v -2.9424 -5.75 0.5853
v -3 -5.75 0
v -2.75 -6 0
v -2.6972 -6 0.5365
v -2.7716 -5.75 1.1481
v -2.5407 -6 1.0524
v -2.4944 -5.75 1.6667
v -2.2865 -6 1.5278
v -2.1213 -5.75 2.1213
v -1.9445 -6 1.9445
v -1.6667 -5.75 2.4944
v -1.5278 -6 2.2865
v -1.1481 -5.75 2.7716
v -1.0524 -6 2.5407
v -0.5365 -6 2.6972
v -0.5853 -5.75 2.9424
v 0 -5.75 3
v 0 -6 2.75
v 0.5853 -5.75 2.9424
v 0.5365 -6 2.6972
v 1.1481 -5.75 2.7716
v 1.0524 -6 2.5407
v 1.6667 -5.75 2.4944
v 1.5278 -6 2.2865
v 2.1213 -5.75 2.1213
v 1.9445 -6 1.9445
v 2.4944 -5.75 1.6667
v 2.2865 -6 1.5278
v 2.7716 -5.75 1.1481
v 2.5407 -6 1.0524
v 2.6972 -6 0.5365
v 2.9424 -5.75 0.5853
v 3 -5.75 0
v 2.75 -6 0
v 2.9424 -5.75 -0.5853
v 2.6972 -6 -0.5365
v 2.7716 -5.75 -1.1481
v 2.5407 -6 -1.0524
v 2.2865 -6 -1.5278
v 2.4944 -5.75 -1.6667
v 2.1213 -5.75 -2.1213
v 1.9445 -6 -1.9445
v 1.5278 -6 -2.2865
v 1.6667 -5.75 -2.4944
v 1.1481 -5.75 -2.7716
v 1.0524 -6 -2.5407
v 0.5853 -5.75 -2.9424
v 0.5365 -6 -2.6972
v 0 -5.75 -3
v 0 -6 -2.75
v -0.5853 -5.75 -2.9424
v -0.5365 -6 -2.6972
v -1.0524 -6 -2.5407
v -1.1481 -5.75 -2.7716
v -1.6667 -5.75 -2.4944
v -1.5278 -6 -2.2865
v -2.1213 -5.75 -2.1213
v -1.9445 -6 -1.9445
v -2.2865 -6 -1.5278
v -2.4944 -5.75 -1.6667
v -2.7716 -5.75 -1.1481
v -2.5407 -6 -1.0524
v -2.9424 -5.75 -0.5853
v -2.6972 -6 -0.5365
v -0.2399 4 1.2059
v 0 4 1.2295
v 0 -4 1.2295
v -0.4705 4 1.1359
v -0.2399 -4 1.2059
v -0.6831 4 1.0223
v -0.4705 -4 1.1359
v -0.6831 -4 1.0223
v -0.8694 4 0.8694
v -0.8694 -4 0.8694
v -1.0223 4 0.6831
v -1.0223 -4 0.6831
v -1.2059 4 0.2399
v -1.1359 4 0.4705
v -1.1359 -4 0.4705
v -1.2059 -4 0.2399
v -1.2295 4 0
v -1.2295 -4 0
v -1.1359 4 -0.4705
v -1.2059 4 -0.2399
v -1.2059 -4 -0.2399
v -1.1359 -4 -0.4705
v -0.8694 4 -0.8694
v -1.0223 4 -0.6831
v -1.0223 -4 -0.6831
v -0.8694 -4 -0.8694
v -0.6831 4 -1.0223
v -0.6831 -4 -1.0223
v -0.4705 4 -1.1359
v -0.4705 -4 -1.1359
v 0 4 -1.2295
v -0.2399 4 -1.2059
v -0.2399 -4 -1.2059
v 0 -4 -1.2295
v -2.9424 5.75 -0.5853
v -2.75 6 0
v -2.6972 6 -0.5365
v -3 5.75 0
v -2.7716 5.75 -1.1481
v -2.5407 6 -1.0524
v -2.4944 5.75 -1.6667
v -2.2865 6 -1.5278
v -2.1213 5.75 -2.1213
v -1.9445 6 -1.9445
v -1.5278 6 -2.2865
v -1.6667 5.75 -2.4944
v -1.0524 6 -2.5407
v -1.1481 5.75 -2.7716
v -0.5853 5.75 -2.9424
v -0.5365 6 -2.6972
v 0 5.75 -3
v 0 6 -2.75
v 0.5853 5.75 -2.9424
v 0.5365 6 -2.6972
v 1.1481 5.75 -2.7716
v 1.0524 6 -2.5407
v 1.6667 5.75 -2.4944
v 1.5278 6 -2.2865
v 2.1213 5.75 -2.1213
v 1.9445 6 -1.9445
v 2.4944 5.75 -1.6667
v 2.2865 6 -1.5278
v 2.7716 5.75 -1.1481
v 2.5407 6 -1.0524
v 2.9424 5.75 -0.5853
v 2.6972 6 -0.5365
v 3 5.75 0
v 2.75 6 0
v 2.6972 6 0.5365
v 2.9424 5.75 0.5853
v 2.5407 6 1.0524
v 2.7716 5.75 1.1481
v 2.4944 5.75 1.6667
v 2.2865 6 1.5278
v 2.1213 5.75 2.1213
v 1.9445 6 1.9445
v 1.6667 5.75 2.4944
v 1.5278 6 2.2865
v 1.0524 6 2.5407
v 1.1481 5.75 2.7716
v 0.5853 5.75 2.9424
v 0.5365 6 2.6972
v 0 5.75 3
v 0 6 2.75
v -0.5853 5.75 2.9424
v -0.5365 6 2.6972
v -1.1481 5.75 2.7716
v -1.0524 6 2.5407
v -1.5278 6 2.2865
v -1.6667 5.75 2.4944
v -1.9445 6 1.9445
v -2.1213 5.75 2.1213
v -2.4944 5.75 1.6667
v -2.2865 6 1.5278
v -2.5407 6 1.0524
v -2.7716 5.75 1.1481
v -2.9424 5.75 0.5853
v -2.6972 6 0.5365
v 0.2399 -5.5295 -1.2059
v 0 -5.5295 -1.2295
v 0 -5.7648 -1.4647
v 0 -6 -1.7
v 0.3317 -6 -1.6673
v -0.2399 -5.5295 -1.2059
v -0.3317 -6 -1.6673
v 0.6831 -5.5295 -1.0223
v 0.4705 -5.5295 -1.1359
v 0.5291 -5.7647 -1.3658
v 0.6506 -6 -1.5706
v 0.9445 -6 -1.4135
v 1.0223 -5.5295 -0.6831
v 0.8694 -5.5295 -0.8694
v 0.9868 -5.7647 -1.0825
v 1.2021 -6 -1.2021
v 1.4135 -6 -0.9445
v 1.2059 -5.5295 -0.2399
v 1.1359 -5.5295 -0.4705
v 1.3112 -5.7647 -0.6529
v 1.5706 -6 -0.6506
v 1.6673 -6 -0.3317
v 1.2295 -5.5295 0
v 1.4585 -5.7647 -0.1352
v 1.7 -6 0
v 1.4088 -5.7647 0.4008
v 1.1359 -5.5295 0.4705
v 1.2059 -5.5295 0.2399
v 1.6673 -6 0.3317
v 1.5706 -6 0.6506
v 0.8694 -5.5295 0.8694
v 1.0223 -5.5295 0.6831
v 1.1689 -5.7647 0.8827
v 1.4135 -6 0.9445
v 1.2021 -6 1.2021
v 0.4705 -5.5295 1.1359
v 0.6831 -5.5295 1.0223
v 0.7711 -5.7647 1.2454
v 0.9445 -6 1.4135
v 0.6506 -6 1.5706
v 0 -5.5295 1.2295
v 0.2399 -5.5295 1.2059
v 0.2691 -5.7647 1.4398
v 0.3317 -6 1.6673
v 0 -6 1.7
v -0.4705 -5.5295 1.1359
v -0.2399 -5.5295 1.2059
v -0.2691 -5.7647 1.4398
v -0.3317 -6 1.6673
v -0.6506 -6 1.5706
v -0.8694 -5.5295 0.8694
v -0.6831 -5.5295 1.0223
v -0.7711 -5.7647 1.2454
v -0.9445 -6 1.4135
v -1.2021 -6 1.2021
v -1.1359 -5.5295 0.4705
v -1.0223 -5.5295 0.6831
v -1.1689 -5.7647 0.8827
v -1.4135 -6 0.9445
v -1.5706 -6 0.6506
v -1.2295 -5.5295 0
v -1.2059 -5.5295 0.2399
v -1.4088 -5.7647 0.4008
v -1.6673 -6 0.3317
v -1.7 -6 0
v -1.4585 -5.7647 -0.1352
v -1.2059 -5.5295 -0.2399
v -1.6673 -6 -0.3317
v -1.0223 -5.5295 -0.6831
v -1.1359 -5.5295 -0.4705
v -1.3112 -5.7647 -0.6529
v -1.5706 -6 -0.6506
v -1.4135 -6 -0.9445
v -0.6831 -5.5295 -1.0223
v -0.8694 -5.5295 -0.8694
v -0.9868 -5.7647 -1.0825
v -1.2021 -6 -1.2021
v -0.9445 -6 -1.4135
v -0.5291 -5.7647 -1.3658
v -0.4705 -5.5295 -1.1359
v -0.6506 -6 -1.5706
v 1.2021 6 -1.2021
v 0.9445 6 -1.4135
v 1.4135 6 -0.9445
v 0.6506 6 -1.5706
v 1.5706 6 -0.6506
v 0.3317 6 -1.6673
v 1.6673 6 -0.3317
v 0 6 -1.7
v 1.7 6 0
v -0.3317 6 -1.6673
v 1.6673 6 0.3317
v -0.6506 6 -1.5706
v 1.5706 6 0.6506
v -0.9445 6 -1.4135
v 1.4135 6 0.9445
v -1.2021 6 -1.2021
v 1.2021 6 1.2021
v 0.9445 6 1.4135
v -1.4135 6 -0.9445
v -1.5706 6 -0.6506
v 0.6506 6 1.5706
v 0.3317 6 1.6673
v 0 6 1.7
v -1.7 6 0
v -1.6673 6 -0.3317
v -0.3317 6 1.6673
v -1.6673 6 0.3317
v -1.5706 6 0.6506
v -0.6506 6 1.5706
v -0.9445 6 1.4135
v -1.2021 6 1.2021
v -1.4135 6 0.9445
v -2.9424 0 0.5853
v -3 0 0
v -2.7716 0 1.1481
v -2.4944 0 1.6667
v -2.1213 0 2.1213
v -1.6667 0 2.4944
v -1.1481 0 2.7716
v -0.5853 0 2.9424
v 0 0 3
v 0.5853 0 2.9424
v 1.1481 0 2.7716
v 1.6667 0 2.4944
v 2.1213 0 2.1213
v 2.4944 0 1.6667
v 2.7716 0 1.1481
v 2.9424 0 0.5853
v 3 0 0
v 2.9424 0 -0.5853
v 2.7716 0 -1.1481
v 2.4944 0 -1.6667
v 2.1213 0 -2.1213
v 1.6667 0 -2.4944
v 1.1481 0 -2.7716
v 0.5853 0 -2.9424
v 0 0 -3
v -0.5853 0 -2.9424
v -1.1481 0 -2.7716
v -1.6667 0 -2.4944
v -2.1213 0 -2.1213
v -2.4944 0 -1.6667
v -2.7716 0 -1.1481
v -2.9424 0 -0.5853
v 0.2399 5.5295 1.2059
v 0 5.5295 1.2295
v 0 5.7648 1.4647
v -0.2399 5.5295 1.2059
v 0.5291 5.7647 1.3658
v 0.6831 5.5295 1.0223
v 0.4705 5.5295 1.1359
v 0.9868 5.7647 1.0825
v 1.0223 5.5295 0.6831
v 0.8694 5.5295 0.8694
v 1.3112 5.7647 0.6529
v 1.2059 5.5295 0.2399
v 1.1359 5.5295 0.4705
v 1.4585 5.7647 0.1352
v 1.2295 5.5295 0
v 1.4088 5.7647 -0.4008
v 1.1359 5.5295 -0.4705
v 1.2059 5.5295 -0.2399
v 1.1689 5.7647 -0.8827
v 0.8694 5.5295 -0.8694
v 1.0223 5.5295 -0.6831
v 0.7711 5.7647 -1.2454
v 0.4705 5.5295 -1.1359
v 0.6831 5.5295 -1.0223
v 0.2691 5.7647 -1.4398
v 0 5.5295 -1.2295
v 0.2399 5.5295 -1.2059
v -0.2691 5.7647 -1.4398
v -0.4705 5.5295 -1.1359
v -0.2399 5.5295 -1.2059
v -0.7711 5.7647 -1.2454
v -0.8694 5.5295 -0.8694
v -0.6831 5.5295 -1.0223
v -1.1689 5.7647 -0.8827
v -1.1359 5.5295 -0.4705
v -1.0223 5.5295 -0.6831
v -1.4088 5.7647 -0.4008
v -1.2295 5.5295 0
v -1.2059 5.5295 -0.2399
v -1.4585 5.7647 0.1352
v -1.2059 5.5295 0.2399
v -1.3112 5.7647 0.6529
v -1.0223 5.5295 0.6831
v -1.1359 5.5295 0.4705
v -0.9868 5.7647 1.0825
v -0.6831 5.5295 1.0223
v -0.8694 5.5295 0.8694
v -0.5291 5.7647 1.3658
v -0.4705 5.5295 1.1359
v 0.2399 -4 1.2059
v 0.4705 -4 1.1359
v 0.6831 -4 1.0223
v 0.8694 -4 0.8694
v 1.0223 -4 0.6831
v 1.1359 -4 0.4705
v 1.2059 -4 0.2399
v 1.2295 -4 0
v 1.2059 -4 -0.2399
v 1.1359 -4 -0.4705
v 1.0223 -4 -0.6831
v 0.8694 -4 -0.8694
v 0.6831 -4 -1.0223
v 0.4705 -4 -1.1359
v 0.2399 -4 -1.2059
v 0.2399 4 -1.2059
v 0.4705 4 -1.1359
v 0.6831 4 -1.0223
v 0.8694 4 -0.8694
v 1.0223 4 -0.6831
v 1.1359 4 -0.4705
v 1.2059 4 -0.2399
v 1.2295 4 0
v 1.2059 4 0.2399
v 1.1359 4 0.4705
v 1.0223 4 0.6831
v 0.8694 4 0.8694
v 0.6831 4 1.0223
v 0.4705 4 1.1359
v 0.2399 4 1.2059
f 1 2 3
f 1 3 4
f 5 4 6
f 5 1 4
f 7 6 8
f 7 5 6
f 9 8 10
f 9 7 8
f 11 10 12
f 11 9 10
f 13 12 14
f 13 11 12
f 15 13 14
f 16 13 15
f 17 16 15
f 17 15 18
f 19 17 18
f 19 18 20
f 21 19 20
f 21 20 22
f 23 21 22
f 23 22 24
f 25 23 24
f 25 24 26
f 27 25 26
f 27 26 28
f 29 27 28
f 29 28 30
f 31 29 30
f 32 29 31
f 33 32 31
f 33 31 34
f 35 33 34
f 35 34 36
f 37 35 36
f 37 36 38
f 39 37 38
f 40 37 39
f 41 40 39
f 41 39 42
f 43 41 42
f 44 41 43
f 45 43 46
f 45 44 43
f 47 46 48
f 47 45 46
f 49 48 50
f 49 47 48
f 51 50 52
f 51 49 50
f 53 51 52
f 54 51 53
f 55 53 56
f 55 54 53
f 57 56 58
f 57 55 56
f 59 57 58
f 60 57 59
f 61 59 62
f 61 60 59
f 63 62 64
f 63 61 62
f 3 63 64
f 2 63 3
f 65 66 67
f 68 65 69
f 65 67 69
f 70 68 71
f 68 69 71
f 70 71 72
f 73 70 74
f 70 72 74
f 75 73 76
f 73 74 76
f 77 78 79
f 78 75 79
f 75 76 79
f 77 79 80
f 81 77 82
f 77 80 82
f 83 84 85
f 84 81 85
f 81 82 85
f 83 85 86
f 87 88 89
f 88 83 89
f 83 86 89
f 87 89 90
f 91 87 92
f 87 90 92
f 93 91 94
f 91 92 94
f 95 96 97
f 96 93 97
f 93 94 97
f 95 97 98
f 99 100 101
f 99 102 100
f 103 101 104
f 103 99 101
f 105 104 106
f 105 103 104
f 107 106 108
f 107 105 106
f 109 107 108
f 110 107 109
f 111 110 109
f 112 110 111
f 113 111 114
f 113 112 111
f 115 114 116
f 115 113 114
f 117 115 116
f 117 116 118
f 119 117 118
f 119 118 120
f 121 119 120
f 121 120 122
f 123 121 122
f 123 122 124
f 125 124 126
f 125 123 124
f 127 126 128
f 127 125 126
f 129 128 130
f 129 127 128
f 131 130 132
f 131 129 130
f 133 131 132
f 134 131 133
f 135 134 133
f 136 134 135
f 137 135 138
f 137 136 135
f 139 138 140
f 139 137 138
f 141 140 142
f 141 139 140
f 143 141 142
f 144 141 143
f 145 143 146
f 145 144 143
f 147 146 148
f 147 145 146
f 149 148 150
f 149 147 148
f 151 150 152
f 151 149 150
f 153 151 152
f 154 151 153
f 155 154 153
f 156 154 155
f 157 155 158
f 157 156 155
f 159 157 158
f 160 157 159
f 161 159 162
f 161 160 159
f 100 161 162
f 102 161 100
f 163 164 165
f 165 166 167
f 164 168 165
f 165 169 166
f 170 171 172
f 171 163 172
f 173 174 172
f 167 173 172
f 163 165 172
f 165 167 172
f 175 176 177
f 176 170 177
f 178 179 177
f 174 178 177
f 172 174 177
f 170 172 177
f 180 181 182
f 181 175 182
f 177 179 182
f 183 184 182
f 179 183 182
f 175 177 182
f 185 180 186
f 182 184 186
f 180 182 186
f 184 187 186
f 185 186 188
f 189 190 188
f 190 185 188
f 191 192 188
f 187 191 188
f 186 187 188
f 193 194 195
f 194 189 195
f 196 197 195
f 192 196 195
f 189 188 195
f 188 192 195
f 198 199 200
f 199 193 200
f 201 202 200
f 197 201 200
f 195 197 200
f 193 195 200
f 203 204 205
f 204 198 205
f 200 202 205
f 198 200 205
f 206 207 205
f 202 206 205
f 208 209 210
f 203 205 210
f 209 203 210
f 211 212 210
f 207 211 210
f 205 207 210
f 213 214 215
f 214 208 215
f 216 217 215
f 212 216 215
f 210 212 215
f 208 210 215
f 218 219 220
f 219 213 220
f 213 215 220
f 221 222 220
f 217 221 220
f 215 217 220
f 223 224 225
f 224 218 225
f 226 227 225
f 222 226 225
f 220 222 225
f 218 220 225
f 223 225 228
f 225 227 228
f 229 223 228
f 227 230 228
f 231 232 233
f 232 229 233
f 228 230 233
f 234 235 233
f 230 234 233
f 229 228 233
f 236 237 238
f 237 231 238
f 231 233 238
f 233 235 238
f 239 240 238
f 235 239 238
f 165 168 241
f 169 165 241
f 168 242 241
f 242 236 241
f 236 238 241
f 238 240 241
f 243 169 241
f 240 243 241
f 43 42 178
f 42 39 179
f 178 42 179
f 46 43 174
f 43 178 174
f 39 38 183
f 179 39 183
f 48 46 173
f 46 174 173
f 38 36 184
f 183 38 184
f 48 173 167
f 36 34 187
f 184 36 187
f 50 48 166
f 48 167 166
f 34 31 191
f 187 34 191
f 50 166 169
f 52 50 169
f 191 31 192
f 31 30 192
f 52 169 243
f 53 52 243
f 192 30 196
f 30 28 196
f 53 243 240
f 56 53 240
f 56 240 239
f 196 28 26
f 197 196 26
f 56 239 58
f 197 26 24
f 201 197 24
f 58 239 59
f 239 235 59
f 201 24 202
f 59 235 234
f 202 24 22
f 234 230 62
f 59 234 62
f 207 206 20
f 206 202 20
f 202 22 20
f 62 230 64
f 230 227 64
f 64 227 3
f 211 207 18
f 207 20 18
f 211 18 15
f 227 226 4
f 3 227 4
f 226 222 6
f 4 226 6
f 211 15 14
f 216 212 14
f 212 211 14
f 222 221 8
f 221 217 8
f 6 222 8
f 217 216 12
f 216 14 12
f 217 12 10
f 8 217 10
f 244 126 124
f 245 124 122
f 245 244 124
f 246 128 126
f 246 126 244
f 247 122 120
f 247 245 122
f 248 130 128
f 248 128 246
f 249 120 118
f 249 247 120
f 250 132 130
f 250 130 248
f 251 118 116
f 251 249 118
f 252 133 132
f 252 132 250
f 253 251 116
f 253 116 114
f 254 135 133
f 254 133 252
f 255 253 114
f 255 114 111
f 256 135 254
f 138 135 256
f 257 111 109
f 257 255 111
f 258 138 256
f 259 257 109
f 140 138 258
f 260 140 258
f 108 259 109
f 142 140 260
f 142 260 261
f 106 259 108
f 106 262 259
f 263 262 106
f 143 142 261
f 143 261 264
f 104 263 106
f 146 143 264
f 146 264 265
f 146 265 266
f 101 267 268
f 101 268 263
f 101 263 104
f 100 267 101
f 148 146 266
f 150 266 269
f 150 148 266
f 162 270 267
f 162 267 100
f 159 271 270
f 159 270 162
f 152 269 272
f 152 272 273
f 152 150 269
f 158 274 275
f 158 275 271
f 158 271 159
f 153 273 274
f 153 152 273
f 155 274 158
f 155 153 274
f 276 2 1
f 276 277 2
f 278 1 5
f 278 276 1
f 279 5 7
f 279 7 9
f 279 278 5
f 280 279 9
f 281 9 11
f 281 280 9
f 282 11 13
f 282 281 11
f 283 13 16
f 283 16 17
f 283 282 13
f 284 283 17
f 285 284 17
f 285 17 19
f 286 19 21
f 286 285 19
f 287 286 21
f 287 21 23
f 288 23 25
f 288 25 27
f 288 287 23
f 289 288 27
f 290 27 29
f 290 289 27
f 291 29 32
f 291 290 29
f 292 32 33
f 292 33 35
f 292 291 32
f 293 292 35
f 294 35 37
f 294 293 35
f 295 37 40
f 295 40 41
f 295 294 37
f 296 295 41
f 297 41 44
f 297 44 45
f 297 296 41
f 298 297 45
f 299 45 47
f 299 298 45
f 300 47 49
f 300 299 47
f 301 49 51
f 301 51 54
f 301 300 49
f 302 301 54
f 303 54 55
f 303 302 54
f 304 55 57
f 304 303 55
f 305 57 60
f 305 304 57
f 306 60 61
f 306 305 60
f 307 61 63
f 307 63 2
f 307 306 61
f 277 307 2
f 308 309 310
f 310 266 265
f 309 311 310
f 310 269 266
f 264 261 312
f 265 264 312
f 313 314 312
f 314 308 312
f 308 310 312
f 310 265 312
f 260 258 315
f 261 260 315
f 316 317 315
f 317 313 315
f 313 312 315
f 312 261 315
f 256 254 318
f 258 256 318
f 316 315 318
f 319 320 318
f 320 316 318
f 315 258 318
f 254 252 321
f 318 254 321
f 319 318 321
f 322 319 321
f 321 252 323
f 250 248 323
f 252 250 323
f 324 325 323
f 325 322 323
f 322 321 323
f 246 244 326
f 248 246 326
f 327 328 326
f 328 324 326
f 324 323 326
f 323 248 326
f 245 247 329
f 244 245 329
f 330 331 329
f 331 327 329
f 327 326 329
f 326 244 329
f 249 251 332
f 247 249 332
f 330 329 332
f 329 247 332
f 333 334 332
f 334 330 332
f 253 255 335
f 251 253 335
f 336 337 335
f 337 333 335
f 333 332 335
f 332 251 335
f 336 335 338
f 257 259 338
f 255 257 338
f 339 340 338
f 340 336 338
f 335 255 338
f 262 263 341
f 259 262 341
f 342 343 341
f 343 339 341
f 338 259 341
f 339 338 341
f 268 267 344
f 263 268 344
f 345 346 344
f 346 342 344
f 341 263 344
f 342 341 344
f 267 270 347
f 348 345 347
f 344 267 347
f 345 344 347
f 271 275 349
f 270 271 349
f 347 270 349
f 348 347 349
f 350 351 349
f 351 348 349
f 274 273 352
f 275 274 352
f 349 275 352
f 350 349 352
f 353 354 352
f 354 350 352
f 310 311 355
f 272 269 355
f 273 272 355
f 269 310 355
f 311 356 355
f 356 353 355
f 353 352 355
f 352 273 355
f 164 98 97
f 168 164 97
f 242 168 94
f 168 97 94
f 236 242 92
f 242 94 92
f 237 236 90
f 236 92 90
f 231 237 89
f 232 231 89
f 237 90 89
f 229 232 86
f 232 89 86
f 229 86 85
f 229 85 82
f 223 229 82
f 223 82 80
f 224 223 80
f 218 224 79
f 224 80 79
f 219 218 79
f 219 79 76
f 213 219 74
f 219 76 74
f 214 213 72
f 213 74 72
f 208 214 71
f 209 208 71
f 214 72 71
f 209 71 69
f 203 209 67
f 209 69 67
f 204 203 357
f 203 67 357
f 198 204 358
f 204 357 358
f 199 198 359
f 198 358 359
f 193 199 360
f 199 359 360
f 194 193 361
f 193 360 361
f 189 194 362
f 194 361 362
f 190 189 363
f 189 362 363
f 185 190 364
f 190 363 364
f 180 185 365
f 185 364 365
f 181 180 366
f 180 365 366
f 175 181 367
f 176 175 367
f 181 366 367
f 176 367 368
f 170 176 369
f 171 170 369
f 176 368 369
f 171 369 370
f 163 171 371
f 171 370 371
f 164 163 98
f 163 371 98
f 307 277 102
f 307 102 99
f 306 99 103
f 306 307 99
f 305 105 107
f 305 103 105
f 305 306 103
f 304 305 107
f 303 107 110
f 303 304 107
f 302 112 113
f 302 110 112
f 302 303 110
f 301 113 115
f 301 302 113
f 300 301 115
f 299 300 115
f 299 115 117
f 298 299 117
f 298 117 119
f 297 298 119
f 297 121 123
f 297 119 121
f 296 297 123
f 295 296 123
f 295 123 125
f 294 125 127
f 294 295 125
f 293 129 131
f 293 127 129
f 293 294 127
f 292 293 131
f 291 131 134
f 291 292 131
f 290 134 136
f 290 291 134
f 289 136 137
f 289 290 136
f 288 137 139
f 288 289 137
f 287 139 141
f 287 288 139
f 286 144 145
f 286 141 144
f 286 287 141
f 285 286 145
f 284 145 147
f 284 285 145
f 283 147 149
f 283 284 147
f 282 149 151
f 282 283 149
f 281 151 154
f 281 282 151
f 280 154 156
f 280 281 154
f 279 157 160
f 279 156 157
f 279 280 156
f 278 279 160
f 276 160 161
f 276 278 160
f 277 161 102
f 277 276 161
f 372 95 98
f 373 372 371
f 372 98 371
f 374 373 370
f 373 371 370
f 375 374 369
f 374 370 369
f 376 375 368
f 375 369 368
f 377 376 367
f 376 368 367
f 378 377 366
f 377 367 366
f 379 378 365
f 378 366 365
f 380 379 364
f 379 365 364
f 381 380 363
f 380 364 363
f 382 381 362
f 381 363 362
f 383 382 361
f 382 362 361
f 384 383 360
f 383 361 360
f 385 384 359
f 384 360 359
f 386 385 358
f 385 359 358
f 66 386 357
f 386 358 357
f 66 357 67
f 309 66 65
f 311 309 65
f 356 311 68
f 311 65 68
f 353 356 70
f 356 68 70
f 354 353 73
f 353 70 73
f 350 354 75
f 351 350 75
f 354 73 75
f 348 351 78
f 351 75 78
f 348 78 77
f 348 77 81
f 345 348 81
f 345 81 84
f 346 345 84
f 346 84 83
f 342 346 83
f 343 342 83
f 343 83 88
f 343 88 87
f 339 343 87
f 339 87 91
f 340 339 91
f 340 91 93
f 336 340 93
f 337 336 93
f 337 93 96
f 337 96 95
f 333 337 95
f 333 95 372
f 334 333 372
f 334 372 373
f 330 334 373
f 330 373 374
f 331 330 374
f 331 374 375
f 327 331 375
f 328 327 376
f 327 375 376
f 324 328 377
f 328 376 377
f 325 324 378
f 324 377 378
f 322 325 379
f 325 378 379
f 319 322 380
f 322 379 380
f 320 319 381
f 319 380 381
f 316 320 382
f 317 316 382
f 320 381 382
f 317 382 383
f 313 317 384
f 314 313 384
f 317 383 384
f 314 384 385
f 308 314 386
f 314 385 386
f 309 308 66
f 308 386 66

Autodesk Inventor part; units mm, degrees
ref_plane "YZ Plane" through (0, 0, 0) normal (1, 0, 0) x (0, 1, 0)
ref_plane "XZ Plane" through (0, 0, 0) normal (0, 1, 0) x (-1, 0, 0)
ref_plane "XY Plane" through (0, 0, 0) normal (0, 0, 1) x (1, 0, 0)
sketch "スケッチ1" plane through (0, 0, 0) normal (0, 1, 0) x (-1, 0, 0)
  circle A0 centre (0, 0) radius 3
  dimension "d0" = 6
extrude "押し出し1" add sketch "スケッチ1" along normal mid plane 12
sketch "スケッチ2" plane through (0, 6, 0) normal (0, 1, 0) x (1, 0, 0)
  point P0 (0, 0)
  point P1 (0, 0)
hole "穴1" at (0, 6, 0) direction (0, -1, 0) diameter 2.459 depth 10 countersink diameter 3.4 countersink angle 90 thread size "M3x0.5" class "6H" standard "ISO Metric profile"
sketch "スケッチ3" plane through (0, -6, 0) normal (0, -1, 0) x (1, 0, 0)
  point P0 (0, 0)
  point P1 (0, 0)
hole "穴2" at (0, -6, 0) direction (0, 1, 0) diameter 2.459 depth 10 countersink diameter 3.4 countersink angle 90 thread size "M3x0.5" class "6H" standard "ISO Metric profile"
chamfer "面取り1" distance 0.25 angle 45 2 edges at (3, -6, 0) (3, 6, 0)
properties part number "Spacer_M3D6L60" material "アルミニウム 6061"
